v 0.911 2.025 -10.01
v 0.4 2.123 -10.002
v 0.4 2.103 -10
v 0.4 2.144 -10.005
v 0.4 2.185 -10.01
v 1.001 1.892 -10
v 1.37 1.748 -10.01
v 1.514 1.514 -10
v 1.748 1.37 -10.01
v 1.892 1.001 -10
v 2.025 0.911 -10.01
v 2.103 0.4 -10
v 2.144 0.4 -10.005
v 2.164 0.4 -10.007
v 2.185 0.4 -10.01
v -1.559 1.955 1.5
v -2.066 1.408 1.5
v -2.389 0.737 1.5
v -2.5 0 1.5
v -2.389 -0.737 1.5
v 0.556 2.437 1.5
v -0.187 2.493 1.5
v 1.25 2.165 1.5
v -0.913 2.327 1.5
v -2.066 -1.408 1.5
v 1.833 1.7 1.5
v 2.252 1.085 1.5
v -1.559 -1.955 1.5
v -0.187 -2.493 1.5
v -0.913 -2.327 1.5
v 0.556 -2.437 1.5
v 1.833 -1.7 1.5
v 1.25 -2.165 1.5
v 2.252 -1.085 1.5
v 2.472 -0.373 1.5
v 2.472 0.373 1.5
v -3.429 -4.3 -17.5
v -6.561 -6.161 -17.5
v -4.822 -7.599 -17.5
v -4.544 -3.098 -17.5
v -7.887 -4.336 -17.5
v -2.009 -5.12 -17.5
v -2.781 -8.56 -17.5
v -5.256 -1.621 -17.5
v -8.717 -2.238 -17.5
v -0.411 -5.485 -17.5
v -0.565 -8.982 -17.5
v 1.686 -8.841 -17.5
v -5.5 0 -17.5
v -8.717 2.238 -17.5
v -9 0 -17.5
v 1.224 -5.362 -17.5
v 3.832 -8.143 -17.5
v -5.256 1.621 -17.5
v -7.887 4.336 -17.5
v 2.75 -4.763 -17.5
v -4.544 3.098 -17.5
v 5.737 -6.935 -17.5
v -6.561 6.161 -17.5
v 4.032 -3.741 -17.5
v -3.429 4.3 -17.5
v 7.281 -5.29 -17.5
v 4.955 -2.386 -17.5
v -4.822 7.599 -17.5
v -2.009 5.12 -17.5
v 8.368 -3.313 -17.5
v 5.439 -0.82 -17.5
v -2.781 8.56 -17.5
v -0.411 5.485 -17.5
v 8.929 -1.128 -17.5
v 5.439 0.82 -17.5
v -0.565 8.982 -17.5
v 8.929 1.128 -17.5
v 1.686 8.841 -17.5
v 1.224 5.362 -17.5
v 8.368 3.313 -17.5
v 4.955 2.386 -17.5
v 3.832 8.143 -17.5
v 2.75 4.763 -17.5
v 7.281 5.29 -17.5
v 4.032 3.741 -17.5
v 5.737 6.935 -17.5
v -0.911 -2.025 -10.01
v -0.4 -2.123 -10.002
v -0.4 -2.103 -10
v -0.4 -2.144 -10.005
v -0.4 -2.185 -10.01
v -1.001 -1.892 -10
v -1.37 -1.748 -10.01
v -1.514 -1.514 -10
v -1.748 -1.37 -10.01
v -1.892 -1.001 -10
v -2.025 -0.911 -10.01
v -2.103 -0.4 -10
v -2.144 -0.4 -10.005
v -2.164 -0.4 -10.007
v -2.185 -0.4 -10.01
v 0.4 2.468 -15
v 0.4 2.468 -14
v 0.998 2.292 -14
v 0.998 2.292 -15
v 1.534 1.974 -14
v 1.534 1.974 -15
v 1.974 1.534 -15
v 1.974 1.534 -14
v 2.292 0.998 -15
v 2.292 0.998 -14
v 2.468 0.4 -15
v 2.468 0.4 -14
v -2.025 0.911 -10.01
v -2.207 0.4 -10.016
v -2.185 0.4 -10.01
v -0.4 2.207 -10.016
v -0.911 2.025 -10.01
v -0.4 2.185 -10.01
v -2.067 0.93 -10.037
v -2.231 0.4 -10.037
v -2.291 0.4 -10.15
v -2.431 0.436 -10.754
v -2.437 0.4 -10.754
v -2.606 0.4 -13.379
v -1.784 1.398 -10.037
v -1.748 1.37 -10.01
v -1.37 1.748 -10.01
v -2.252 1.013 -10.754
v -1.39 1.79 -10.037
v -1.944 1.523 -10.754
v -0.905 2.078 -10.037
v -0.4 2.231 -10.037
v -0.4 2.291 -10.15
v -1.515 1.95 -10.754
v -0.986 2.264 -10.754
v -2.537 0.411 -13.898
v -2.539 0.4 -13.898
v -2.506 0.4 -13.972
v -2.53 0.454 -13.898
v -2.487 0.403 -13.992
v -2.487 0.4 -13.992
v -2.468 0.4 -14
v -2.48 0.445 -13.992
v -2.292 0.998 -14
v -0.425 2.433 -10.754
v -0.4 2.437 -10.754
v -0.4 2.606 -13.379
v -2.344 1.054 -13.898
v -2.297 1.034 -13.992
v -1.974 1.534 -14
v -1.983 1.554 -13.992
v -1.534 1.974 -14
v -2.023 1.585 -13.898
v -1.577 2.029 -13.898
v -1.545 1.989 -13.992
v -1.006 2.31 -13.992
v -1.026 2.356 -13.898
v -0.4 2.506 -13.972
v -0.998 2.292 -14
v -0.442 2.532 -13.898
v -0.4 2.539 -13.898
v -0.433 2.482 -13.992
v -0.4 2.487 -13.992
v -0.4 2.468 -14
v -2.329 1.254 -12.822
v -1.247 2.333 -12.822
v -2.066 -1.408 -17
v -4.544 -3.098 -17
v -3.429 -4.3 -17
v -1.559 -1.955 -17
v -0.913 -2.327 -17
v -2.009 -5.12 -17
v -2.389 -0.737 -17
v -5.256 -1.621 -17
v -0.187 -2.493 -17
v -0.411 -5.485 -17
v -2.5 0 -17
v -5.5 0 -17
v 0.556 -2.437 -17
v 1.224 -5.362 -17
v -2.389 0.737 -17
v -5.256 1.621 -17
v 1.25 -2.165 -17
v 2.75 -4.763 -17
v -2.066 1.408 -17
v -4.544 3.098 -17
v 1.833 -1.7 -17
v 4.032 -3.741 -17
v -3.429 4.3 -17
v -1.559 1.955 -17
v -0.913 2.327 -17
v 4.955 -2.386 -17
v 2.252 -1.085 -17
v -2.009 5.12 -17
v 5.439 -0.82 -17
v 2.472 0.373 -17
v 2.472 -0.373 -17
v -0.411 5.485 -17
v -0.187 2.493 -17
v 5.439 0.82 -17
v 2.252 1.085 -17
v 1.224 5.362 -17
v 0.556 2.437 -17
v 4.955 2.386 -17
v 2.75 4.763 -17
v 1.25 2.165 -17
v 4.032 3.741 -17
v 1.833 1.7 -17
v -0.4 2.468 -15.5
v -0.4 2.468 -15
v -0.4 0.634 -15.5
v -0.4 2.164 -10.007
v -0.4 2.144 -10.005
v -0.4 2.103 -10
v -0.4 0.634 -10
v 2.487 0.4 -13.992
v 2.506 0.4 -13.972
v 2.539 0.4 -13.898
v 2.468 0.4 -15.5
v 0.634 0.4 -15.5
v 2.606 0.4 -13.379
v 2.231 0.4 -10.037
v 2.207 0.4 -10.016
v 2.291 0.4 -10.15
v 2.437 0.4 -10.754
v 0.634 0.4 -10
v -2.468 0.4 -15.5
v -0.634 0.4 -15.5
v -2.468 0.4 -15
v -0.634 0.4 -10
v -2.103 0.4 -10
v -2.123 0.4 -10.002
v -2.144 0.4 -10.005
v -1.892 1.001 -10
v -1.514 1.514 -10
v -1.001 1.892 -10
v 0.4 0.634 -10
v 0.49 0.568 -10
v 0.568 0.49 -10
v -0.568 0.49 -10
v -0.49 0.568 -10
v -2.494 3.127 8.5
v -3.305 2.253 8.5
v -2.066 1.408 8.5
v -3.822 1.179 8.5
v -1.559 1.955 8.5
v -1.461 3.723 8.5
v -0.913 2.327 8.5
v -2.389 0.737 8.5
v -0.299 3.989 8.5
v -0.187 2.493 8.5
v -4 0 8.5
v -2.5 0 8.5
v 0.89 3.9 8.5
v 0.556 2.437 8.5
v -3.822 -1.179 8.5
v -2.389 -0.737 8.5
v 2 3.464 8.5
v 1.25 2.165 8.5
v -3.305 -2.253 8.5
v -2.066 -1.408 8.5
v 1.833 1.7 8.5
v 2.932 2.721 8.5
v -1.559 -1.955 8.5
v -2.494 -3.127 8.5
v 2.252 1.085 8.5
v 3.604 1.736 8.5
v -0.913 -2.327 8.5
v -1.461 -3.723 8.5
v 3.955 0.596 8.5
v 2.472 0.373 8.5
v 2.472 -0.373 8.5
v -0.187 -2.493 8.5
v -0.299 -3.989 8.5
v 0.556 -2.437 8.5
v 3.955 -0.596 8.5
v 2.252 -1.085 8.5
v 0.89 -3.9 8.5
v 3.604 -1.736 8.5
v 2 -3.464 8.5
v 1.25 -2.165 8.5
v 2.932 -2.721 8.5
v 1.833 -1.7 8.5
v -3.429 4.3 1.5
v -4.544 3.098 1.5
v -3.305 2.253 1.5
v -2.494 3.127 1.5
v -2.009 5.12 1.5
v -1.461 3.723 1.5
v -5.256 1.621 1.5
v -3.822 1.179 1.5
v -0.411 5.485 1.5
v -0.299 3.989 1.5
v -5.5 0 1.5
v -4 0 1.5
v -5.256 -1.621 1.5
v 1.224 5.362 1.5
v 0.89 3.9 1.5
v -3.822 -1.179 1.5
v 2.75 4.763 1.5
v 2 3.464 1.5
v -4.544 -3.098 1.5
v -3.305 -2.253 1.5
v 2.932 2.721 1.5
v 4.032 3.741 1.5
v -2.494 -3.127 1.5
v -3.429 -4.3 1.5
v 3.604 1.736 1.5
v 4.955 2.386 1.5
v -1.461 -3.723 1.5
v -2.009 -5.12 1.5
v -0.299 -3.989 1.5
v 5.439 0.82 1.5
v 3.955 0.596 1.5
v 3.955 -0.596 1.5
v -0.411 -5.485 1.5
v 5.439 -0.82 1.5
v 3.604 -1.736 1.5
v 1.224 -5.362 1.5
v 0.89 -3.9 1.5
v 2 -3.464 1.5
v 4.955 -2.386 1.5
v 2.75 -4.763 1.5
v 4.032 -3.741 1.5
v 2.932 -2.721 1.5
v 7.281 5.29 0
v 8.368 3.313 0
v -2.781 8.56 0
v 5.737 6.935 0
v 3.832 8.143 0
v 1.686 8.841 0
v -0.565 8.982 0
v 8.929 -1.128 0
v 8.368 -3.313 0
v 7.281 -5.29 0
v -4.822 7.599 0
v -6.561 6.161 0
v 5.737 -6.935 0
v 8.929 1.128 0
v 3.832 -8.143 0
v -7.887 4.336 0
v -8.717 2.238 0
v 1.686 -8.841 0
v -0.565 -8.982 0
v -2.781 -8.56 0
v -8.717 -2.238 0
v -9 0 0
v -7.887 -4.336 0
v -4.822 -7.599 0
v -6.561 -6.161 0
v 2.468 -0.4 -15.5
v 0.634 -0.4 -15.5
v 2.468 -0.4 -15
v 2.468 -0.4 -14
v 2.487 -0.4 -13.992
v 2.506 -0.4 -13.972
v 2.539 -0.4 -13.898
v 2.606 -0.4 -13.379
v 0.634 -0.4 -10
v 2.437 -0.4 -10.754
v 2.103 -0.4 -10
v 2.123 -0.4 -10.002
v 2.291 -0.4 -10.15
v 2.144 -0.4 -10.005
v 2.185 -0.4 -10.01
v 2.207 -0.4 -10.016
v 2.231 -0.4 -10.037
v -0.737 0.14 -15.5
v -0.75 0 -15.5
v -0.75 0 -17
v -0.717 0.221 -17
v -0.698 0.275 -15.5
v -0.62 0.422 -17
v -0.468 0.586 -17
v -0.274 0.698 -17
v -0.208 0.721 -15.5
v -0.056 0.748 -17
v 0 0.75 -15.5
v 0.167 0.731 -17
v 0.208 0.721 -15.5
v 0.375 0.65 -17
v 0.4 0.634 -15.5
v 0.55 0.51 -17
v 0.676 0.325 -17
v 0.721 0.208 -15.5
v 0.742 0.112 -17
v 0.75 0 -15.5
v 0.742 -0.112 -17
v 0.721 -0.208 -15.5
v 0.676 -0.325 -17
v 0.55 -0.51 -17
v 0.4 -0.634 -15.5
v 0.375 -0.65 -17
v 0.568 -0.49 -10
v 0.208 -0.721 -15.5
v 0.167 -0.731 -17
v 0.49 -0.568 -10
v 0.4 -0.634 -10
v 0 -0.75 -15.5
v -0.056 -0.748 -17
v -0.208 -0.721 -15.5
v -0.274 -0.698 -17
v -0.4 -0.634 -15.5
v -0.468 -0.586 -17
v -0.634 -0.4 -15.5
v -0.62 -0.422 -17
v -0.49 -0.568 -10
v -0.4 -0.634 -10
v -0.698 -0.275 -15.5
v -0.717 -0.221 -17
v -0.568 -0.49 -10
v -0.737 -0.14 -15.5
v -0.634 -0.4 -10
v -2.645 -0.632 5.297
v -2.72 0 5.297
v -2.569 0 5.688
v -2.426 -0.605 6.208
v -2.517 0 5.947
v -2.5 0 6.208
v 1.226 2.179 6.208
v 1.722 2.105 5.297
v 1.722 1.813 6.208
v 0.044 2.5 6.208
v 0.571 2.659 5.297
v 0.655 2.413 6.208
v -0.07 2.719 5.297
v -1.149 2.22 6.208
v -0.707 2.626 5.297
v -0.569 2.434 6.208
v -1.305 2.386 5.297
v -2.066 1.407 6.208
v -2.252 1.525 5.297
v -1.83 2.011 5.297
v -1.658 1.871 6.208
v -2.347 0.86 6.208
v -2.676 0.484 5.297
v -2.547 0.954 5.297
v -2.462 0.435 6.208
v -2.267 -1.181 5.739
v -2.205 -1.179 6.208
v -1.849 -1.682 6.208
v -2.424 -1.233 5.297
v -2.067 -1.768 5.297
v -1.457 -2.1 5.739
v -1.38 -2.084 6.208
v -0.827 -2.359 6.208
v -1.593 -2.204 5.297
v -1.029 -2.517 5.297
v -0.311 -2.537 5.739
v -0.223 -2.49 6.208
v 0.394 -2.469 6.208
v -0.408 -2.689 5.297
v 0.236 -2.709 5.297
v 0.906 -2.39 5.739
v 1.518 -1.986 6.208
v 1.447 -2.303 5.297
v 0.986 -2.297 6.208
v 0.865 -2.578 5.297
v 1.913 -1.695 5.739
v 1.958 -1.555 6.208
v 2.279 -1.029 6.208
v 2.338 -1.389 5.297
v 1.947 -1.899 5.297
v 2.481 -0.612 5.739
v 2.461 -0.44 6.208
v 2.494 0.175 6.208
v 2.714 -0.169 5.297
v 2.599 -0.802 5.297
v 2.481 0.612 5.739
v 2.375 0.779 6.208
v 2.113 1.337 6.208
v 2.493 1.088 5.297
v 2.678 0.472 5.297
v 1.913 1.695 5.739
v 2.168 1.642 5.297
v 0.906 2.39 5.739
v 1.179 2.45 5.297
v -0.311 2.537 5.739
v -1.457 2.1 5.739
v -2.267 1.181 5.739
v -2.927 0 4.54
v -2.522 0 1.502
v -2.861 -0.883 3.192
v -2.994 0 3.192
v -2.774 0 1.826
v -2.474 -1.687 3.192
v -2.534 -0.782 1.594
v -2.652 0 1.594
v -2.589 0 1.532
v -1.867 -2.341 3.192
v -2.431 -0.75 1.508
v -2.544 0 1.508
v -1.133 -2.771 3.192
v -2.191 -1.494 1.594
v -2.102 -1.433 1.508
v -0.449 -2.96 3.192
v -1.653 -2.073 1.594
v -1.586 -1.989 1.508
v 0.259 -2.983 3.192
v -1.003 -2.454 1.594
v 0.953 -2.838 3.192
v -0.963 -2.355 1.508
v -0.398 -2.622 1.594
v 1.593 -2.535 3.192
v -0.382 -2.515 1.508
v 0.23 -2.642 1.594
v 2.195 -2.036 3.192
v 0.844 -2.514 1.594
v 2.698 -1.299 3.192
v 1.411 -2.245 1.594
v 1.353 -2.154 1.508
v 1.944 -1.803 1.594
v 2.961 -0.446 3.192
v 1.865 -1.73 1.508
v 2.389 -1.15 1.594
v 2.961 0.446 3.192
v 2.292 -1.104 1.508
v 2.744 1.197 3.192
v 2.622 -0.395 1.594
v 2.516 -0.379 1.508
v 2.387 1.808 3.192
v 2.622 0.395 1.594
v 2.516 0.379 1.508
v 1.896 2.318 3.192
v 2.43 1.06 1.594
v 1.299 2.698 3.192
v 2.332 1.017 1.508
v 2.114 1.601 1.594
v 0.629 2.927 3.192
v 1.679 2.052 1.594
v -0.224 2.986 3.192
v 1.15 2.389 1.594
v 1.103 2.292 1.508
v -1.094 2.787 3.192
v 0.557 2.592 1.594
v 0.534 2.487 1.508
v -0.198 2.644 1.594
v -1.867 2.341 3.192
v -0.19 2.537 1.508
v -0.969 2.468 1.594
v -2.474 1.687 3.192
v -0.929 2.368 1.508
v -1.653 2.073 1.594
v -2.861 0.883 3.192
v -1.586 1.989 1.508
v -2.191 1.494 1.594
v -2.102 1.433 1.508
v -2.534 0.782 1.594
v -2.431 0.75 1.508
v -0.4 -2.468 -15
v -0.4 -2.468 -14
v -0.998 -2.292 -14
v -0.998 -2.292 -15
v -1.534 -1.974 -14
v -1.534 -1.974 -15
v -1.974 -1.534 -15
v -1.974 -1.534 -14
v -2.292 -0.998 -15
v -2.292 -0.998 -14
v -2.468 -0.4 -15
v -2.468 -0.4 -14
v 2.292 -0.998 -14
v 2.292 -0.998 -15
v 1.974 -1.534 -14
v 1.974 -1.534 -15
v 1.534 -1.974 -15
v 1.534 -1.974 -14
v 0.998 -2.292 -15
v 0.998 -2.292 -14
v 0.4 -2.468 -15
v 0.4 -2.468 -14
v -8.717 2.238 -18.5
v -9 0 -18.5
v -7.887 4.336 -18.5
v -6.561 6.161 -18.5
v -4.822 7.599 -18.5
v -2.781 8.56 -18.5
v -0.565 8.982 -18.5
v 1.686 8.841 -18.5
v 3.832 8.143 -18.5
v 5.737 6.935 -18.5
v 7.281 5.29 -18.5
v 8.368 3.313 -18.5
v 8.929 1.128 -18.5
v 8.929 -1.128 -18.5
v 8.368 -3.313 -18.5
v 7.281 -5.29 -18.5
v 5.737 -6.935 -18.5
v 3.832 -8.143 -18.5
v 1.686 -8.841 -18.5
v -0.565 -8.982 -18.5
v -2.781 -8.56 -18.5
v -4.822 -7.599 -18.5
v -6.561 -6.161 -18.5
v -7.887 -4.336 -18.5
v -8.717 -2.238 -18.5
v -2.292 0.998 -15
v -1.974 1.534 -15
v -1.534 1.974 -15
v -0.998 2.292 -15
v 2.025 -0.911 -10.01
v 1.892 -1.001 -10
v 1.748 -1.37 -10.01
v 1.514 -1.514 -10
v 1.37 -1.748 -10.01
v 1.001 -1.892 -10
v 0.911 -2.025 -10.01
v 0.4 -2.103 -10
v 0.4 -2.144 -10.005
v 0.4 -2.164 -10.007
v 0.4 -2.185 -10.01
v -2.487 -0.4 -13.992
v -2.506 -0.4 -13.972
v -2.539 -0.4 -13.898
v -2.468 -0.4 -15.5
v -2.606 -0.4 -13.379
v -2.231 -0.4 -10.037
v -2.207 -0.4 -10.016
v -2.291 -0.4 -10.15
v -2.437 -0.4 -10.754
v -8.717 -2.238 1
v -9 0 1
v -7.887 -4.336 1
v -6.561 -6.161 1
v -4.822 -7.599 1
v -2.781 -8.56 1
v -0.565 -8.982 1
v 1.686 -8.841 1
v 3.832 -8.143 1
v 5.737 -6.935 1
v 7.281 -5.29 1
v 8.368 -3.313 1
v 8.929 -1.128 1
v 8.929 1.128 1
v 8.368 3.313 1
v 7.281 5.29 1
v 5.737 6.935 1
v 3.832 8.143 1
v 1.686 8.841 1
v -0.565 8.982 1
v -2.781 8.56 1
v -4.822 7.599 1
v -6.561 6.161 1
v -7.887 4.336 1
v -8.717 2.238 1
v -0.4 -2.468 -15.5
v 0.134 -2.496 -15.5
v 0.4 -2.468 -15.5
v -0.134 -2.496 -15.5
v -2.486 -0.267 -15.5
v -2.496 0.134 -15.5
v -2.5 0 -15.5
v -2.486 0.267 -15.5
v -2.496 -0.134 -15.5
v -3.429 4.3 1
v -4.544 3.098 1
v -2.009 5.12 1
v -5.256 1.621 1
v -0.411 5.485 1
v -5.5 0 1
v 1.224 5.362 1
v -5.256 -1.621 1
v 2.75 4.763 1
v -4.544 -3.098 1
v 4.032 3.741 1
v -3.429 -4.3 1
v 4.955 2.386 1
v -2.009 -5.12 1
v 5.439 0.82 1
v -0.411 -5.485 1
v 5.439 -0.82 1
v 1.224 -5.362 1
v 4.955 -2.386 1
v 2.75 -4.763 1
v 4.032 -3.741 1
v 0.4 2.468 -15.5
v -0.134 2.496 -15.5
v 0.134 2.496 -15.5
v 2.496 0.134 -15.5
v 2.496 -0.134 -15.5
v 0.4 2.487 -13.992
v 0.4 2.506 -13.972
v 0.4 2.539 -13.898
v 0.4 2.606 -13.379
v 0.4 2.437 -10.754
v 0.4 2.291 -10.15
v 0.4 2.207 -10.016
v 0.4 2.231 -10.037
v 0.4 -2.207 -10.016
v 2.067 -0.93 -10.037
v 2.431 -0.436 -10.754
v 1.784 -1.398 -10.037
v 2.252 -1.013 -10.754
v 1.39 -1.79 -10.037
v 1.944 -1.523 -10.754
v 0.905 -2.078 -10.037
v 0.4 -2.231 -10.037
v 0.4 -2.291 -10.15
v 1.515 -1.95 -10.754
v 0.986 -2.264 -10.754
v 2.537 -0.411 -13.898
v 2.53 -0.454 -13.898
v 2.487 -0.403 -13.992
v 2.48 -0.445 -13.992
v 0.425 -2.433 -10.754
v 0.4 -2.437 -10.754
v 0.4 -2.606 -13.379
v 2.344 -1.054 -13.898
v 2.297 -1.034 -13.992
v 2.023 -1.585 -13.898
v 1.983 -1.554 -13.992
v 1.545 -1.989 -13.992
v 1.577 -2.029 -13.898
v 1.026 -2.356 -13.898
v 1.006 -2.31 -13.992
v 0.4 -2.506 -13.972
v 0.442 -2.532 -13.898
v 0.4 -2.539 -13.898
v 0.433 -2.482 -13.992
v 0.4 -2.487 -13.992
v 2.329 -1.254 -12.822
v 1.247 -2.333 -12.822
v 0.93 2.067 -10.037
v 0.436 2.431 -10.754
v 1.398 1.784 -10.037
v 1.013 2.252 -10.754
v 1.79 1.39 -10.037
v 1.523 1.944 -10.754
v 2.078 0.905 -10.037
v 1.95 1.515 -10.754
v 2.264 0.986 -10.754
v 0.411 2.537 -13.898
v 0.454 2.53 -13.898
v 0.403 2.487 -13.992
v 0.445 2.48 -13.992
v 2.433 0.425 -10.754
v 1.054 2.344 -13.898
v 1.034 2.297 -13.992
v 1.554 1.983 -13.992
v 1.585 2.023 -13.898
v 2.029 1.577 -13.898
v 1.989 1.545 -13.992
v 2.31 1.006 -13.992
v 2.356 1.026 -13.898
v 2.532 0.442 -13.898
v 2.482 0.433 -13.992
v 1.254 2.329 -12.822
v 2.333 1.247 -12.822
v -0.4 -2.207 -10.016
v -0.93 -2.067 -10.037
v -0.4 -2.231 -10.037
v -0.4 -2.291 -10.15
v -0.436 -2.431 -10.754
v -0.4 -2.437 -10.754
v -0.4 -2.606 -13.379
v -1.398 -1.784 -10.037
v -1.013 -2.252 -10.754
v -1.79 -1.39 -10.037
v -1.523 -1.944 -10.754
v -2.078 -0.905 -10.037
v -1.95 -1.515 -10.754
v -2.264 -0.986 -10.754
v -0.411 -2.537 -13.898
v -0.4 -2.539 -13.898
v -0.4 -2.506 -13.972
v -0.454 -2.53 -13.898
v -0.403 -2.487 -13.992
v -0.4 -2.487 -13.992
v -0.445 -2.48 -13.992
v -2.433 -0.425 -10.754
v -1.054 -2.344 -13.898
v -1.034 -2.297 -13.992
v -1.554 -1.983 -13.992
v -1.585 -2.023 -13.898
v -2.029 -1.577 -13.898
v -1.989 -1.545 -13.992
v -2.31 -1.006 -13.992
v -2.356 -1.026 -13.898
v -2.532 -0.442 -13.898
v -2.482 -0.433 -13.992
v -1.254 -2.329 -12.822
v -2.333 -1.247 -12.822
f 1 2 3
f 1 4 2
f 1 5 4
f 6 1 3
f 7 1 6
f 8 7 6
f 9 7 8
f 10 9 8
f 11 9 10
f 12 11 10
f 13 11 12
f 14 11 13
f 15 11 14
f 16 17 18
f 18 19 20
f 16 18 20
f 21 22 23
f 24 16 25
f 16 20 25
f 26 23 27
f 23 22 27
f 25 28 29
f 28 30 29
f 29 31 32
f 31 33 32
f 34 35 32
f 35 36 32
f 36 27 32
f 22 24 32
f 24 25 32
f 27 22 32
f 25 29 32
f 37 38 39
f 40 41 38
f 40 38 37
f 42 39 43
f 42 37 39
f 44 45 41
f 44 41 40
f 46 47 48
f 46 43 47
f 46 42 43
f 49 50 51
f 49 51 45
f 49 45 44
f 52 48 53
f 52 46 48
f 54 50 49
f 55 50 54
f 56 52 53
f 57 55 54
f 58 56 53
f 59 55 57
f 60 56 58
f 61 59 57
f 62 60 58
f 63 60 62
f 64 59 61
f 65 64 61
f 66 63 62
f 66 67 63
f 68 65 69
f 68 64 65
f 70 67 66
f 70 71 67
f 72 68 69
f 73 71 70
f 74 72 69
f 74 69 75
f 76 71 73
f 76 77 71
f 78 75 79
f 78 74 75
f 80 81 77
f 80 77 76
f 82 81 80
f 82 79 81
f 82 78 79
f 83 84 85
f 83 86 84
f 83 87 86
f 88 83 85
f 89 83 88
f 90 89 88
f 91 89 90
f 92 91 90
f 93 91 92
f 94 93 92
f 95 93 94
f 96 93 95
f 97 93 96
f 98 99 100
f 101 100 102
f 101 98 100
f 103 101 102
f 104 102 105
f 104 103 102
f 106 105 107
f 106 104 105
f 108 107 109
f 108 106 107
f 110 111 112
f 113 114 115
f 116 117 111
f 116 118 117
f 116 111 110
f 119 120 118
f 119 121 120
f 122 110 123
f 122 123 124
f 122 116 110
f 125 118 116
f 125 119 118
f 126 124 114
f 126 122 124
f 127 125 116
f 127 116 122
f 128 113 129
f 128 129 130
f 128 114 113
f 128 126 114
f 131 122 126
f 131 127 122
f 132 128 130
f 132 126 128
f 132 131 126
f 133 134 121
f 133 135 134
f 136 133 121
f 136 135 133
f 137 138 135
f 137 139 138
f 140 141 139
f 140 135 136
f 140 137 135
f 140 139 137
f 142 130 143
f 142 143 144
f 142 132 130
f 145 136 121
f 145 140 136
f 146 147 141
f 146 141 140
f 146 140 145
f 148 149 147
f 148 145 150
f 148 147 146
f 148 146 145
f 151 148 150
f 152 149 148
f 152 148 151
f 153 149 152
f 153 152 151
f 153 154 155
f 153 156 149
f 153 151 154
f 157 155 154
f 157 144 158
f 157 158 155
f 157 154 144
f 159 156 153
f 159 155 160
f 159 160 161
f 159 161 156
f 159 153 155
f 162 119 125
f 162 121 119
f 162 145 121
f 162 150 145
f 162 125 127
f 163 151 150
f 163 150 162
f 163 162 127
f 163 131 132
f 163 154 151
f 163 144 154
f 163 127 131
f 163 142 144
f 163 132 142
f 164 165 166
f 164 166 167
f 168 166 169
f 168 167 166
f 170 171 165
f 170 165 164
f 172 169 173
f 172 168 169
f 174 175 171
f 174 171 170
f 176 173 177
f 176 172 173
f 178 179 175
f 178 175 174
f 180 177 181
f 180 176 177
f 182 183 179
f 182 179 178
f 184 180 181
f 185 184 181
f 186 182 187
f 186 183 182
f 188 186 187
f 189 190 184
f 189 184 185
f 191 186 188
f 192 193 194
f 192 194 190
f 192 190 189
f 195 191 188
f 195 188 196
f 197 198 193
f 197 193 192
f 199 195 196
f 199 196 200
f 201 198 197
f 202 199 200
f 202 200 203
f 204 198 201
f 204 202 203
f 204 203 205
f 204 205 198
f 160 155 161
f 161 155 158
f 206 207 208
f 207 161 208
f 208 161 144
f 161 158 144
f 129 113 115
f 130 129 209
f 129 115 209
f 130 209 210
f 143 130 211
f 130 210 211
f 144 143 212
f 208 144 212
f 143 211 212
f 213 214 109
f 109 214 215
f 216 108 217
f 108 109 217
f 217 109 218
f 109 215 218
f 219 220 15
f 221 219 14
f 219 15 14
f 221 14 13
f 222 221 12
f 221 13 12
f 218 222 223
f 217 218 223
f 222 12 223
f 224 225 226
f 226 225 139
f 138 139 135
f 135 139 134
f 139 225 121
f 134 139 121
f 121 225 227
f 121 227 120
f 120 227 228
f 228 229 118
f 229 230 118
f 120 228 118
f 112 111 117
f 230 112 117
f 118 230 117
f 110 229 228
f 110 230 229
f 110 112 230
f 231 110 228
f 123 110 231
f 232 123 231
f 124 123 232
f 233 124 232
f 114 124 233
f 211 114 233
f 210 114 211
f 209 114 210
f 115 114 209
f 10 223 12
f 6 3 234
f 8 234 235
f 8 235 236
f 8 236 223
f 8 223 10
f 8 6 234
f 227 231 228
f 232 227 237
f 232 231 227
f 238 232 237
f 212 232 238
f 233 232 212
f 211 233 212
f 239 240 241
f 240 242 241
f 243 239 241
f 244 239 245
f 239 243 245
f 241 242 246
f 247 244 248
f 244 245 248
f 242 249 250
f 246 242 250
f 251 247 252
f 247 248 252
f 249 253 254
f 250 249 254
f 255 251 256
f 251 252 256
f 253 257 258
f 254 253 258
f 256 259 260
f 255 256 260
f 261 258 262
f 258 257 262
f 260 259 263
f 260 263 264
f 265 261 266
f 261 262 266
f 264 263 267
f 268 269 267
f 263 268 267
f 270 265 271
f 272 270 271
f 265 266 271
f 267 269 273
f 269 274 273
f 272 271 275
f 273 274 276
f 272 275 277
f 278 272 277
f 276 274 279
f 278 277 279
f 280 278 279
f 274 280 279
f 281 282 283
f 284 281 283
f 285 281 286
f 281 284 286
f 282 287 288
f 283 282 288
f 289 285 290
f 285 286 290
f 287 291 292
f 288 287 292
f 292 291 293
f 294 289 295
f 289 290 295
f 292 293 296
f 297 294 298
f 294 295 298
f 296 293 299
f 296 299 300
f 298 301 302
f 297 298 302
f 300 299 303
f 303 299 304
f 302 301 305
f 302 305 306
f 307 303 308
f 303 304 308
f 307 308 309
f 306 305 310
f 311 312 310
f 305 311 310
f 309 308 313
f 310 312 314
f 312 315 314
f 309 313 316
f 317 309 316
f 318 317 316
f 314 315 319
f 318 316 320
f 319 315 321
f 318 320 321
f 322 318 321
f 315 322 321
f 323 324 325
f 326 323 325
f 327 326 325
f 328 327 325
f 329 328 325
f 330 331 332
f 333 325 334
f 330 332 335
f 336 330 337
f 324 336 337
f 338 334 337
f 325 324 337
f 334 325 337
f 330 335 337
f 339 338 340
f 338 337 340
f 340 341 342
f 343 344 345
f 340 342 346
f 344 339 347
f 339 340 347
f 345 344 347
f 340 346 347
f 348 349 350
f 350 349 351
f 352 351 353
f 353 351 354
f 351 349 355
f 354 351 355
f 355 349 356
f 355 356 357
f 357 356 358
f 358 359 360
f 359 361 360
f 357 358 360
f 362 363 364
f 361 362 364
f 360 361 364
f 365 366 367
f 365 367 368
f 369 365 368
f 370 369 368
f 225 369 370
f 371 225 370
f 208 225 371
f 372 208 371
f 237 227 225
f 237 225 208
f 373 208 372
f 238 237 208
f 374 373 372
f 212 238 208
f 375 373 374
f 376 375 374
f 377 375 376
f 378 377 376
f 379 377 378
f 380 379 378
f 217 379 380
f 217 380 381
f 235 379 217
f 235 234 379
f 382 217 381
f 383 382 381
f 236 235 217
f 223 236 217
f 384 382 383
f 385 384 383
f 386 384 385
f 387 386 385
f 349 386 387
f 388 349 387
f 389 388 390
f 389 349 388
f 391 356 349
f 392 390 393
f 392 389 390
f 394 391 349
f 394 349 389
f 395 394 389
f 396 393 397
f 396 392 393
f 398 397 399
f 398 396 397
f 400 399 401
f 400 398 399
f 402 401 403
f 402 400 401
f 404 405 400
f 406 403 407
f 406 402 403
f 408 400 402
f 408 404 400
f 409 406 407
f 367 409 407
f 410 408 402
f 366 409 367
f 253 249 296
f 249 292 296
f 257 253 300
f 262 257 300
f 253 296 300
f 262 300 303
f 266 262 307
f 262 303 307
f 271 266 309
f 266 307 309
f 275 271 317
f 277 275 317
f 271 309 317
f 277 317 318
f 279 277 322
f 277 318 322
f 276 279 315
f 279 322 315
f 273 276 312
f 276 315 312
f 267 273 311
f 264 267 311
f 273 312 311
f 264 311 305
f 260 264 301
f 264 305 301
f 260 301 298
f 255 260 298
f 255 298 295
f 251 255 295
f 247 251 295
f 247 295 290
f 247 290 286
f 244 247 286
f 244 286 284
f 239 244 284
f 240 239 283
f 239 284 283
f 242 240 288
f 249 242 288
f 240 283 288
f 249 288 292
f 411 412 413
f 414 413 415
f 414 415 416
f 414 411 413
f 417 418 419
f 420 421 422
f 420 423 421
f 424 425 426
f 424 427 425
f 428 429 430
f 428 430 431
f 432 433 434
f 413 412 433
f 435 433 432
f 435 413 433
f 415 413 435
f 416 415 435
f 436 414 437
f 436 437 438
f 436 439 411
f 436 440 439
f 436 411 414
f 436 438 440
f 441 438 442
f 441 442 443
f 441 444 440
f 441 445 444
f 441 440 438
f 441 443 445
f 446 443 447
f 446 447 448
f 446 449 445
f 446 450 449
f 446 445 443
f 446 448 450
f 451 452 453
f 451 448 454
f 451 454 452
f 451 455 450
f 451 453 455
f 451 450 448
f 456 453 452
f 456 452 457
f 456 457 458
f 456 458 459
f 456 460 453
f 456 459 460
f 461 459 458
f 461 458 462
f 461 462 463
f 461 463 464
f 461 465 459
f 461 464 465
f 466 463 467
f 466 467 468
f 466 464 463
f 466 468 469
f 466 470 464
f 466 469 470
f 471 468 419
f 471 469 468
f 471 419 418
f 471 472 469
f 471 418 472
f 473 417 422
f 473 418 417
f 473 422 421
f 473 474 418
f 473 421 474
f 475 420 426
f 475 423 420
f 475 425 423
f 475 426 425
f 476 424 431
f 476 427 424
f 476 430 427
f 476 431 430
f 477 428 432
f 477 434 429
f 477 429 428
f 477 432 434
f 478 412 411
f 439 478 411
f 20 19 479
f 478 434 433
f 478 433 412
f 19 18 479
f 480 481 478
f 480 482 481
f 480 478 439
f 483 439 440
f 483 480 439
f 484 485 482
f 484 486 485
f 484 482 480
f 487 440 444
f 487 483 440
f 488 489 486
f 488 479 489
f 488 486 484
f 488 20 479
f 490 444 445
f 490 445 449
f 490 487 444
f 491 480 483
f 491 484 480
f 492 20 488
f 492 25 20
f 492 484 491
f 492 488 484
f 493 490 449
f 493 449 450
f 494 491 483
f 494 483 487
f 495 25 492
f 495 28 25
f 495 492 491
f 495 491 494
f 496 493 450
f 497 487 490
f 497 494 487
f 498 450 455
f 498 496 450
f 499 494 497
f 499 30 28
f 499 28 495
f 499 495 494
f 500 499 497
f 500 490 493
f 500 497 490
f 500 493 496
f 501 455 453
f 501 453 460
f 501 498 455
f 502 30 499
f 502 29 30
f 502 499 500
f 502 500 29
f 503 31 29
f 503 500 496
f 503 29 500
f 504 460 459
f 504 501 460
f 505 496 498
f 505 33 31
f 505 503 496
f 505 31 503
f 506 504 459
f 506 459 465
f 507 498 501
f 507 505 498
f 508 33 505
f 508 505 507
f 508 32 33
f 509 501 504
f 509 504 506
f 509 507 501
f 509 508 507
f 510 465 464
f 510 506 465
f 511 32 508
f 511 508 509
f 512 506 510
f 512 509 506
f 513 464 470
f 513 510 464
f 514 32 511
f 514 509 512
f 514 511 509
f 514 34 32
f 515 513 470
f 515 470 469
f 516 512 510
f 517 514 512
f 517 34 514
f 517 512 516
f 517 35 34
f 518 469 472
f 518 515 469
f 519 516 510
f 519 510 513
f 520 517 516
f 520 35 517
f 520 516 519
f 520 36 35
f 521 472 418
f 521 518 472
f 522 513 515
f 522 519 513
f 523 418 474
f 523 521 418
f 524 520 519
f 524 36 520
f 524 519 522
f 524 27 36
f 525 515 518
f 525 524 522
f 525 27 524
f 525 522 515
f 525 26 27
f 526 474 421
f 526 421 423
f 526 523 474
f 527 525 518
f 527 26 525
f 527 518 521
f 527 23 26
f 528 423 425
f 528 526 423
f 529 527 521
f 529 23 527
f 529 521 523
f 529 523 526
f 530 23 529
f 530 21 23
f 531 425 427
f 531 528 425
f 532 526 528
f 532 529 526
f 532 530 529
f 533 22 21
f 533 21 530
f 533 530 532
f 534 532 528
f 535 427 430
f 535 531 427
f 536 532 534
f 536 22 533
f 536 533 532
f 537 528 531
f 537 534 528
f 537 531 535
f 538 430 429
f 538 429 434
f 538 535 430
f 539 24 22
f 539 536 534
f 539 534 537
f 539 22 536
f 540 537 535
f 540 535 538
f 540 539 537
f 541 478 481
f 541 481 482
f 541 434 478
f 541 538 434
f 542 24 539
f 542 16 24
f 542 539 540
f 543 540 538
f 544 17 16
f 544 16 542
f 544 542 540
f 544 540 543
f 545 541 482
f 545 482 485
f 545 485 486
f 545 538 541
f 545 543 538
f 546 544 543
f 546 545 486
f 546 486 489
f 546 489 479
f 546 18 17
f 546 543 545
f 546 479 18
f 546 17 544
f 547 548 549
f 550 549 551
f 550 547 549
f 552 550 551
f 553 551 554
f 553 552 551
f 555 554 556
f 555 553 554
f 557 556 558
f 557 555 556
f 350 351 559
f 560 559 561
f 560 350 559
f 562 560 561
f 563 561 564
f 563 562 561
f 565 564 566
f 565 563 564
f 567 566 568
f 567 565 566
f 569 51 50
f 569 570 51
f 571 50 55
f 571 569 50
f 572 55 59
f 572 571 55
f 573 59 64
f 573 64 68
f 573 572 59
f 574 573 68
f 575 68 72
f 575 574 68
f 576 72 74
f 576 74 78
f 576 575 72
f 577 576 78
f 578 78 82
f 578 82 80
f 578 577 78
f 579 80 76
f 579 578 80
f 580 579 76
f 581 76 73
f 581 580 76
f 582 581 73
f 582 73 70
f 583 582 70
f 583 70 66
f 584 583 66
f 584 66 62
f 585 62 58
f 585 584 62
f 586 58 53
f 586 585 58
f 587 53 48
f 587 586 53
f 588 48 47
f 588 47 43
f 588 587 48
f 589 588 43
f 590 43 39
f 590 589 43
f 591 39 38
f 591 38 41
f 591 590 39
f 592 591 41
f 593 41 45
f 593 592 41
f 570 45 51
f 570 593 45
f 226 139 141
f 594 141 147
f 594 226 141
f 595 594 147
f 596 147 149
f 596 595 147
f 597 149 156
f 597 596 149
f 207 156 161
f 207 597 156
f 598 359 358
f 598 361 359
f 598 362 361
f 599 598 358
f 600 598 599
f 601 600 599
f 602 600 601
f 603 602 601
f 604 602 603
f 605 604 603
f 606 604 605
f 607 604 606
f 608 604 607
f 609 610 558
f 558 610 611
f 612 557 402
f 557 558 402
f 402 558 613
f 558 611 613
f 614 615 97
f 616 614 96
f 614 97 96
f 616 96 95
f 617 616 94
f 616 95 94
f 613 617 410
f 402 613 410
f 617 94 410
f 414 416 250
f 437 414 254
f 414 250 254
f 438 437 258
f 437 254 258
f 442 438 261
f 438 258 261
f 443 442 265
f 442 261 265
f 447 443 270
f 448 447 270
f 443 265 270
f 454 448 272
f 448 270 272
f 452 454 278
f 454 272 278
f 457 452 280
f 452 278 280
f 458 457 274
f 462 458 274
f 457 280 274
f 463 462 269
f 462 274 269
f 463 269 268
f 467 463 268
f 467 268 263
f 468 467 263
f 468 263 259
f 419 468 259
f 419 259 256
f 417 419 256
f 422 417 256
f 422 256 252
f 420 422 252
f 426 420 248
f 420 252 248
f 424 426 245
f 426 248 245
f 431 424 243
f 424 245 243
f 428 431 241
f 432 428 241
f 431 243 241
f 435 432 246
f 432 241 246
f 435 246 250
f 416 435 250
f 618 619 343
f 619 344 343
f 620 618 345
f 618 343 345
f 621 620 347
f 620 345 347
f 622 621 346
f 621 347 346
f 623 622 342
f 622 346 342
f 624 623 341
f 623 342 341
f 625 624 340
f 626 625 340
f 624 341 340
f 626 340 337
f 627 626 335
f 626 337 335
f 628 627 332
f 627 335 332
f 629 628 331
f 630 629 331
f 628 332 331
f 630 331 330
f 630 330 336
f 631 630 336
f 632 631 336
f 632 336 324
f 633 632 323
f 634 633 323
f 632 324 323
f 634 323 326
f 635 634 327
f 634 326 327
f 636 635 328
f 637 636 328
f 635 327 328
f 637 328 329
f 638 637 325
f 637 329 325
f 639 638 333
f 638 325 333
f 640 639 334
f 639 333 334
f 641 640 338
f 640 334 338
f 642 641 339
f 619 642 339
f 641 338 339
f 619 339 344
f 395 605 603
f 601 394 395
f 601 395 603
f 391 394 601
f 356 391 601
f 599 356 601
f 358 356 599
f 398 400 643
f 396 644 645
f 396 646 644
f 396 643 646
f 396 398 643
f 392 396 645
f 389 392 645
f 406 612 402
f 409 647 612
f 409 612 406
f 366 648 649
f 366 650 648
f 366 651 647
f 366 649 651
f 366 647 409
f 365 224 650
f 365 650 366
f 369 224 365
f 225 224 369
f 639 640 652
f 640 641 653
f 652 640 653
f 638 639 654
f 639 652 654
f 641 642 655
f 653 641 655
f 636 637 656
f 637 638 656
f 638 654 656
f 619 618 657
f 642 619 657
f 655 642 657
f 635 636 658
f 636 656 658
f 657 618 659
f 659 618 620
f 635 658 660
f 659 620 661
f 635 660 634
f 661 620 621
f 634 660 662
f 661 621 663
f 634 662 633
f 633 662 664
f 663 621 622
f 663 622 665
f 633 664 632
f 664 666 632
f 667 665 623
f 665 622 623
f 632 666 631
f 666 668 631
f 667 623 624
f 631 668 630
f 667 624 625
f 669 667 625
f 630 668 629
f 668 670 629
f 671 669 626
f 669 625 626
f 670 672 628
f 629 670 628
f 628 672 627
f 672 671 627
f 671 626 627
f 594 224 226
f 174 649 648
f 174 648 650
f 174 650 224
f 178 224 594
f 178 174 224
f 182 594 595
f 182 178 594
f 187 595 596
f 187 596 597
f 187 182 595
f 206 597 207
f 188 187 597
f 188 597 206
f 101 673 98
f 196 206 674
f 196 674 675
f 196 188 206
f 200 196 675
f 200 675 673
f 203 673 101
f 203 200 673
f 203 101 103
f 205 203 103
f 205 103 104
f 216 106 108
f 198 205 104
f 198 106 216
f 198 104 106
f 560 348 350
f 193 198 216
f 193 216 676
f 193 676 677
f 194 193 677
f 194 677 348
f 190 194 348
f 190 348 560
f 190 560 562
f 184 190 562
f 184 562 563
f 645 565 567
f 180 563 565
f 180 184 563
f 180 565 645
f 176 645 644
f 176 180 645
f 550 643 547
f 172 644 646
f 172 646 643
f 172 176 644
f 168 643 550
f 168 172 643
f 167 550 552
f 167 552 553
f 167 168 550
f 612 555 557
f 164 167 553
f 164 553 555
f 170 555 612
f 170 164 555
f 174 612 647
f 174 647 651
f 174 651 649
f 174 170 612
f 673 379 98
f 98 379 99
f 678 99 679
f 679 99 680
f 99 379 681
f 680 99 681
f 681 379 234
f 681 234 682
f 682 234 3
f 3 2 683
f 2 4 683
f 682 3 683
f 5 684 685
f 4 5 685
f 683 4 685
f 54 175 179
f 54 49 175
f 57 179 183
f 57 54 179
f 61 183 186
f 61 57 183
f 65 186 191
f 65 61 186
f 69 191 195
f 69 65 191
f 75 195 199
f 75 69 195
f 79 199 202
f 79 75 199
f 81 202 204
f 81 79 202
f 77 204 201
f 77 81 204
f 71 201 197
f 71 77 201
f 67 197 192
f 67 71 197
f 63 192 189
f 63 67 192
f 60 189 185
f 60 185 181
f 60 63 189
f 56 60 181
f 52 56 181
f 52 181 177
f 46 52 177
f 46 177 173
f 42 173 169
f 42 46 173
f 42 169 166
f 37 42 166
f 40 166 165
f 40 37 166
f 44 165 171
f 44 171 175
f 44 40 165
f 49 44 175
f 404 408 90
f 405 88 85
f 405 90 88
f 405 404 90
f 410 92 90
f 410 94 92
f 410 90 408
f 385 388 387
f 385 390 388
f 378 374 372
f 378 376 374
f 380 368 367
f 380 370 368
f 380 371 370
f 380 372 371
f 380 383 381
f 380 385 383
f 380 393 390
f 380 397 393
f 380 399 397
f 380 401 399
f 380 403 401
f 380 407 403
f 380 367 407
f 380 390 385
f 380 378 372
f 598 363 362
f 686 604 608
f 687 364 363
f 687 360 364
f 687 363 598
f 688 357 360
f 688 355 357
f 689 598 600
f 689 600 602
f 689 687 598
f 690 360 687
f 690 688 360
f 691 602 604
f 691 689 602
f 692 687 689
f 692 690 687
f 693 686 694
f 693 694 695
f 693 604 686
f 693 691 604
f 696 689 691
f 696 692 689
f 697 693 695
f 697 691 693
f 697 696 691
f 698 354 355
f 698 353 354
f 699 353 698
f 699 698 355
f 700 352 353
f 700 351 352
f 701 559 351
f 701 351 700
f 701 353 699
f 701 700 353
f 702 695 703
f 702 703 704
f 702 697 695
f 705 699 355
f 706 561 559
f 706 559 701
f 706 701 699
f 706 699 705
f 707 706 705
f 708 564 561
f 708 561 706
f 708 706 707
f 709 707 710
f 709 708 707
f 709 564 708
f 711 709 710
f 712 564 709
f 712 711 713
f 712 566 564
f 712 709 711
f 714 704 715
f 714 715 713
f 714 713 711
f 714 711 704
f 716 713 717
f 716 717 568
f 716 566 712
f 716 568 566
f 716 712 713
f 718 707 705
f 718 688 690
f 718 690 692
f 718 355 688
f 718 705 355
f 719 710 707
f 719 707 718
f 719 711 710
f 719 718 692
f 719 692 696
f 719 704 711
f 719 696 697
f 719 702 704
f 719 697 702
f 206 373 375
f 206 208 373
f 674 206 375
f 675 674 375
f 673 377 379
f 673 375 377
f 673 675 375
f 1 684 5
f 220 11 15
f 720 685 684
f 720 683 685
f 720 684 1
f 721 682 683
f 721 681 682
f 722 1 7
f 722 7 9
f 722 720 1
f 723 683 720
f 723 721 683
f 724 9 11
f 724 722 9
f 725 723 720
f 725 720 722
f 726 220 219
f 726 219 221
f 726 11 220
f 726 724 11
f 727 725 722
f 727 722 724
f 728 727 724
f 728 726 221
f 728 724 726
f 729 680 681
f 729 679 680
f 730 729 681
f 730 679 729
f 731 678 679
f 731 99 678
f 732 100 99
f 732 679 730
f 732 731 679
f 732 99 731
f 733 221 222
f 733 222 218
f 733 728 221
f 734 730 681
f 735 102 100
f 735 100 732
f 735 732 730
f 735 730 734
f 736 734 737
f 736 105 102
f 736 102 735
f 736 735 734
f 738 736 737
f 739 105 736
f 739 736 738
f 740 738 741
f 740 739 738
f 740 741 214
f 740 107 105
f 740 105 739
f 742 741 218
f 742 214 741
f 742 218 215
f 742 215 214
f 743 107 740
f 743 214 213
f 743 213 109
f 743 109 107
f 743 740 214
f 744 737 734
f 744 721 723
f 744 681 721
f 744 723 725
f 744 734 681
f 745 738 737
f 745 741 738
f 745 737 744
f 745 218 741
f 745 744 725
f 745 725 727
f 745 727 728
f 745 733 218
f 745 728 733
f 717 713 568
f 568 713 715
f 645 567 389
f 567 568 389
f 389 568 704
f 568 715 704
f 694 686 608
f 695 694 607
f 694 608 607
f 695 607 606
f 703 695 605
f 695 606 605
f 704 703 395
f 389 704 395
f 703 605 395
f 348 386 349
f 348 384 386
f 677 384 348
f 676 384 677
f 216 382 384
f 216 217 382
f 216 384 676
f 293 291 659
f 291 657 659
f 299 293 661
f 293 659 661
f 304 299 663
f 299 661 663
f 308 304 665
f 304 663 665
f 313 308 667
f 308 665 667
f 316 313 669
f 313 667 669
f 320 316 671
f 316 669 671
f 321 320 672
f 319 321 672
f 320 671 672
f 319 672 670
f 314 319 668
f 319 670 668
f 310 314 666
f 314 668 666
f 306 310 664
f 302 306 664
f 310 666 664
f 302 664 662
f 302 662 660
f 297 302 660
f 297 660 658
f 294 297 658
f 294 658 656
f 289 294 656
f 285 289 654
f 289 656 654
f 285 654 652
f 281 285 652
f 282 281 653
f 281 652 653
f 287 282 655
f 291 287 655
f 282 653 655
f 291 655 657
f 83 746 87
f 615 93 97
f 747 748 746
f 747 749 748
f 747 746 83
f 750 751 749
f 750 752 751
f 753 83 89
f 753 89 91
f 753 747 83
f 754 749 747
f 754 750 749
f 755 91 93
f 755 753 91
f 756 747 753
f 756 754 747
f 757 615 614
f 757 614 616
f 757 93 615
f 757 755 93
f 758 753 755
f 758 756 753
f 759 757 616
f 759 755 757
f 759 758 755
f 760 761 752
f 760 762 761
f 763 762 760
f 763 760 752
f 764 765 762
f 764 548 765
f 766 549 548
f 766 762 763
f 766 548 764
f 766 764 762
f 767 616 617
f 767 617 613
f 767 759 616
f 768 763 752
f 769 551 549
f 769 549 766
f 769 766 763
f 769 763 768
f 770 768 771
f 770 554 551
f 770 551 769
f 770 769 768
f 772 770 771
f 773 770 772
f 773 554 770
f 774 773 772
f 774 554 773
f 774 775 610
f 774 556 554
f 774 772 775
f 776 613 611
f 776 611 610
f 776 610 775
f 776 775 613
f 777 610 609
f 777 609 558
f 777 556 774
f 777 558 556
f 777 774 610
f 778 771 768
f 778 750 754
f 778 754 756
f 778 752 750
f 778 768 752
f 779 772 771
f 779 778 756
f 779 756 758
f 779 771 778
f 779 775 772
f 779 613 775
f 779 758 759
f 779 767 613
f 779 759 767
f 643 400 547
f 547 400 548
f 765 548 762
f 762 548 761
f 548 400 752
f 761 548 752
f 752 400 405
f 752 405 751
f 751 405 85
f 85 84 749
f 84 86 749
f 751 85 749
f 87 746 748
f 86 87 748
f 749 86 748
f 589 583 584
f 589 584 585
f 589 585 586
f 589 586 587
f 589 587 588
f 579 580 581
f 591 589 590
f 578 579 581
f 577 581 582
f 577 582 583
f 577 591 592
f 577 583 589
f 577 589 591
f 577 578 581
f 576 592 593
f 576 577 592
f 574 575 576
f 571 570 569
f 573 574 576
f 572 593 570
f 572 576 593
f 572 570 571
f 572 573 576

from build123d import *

# Parameters (mm, degrees)
F2_R     = 2
F4_W     = 0.8
F4_H     = 0.8
F5_DEPTH = 5.5


# Not quite as in the source:
# - ends of sketch curves that miss each other by under 0.0002 mm in the source are joined


with BuildPart() as f1:
    # F0 (on Front) → F1 (revolve)
    with BuildSketch(Plane.XZ):
        with BuildLine():
            Line((-9, 0), (0, 0))
            Line((0, 0), (0, 1.5))
            Line((0, 1.5), (-2.5, 1.5))
            add(Edge.make_bspline(
                [(-2.5, 5.5), (-3, 5.5), (-3, 3.5), (-3, 1.5), (-2.5, 1.5)],
                knots=[3.1415926536, 3.1415926536, 3.1415926536, 4.7123889804, 4.7123889804, 6.2831853072, 6.2831853072, 6.2831853072], degree=2, weights=[1, 0.7071067812, 1, 0.7071067812, 1]))
            Line((-2.5, 5.5), (-2.5, 8.5))
            Line((-2.5, 8.5), (-4, 8.5))
            Line((-4, 8.5), (-4, 1.5))
            Line((-4, 1.5), (-5.5, 1.5))
            Line((-5.5, 1.5), (-5.5, 1))
            Line((-5.5, 1), (-9, 1))
            Line((-9, 1), (-9, 0))
        make_face()
    revolve(axis=Axis((0, 0, 0.75), (0, 0, 1)))

    # F2
    f2_edges = [f1.edges().sort_by_distance(p)[0] for p in [
        (2.5, 0, 5.5),
    ]]
    fillet(f2_edges, radius=F2_R)


with BuildPart() as f3:
    # F0 (on Front) → F3 (revolve)
    with BuildSketch(Plane.XZ):
        with BuildLine():
            Line((-9, -18.5), (0, -18.5))
            Line((0, -18.5), (0, -17))
            Line((0, -17), (-0.75, -17))
            Line((-0.75, -17), (-0.75, -10))
            Line((-0.75, -10), (-2.14088, -10))
            Line((-2.14088, -10), (-2.2209772679, -10.009743799))
            add(Edge.make_bspline(
                [(-2.2209772679, -10.009743799), (-2.4703682805, -9.9923046805), (-2.609881228, -11.987432781), (-2.7493941755, -13.9825608816), (-2.5000031629, -14)],
                knots=[3.1415926536, 3.1415926536, 3.1415926536, 4.7123889804, 4.7123889804, 6.2831853072, 6.2831853072, 6.2831853072], degree=2, weights=[1, 0.7071067812, 1, 0.7071067812, 1]))
            Line((-2.5000031629, -14), (-2.5, -15))
            Line((-2.5, -15), (-2.5, -17))
            Line((-2.5, -17), (-4, -17))
            Line((-4, -17), (-5.5, -17))
            Line((-5.5, -17), (-5.5, -17.5))
            Line((-5.5, -17.5), (-9, -17.5))
            Line((-9, -17.5), (-9, -18.5))
        make_face()
    revolve(axis=Axis((0, 0, -17.75), (0, 0, -1)))

    # F4 (on face) → F5 (cut)
    with BuildSketch(Plane.XY.offset(-10)):
        with BuildLine():
            Line((-0.4, -6), (0.4, -6))
            Line((0.4, -6), (0.4, -2.1031802525))
            ThreePointArc((0.4, -2.1031802525), (0, -2.14088), (-0.4, -2.1031802525))
            Line((-0.4, -2.1031802525), (-0.4, -6))
        make_face()
        with BuildLine():
            ThreePointArc((-0.4, -2.1031802525), (0, -2.14088), (0.4, -2.1031802525))
            Line((0.4, -2.1031802525), (0.4, -0.634428877))
            ThreePointArc((0.4, -0.634428877), (0, -0.75), (-0.4, -0.634428877))
            Line((-0.4, -0.634428877), (-0.4, -2.1031802525))
        make_face()
        with BuildLine():
            ThreePointArc((-0.4, -0.634428877), (0, -0.75), (0.4, -0.634428877))
            Line((0.4, -0.634428877), (0.4, -0.4))
            Line((0.4, -0.4), (-0.4, -0.4))
            Line((-0.4, -0.4), (-0.4, -0.634428877))
        make_face()
        with BuildLine():
            Line((-0.634428877, -0.4), (-0.4, -0.4))
            Line((-0.4, -0.4), (-0.4, 0.4))
            Line((-0.4, 0.4), (-0.634428877, 0.4))
            ThreePointArc((-0.634428877, 0.4), (-0.75, 0), (-0.634428877, -0.4))
        make_face()
        with BuildLine():
            Line((-6, -0.4), (-2.1031802525, -0.4))
            ThreePointArc((-2.1031802525, -0.4), (-2.14088, 0), (-2.1031802525, 0.4))
            Line((-2.1031802525, 0.4), (-6, 0.4))
            Line((-6, 0.4), (-6, -0.4))
        make_face()
        Rectangle(F4_W, F4_H)
        with BuildLine():
            Line((-0.4, 0.4), (0.4, 0.4))
            Line((0.4, 0.4), (0.4, 0.634428877))
            ThreePointArc((0.4, 0.634428877), (0, 0.75), (-0.4, 0.634428877))
            Line((-0.4, 0.634428877), (-0.4, 0.4))
        make_face()
        with BuildLine():
            ThreePointArc((0.4, 2.1031802525), (0, 2.14088), (-0.4, 2.1031802525))
            Line((-0.4, 2.1031802525), (-0.4, 0.634428877))
            ThreePointArc((-0.4, 0.634428877), (0, 0.75), (0.4, 0.634428877))
            Line((0.4, 0.634428877), (0.4, 2.1031802525))
        make_face()
        with BuildLine():
            Line((-0.4, 6), (-0.4, 2.1031802525))
            ThreePointArc((-0.4, 2.1031802525), (0, 2.14088), (0.4, 2.1031802525))
            Line((0.4, 2.1031802525), (0.4, 6))
            Line((0.4, 6), (-0.4, 6))
        make_face()
        with BuildLine():
            Line((0.634428877, -0.4), (2.1031802525, -0.4))
            ThreePointArc((2.1031802525, -0.4), (2.1314342253, -0.2008863304), (2.14088, 0))
            ThreePointArc((2.14088, 0), (2.1314342253, 0.2008863304), (2.1031802525, 0.4))
            Line((2.1031802525, 0.4), (0.634428877, 0.4))
            ThreePointArc((0.634428877, 0.4), (0.7205281597, 0.2081806214), (0.75, 0))
            ThreePointArc((0.75, 0), (0.7205281597, -0.2081806214), (0.634428877, -0.4))
        make_face()
        with BuildLine():
            Line((0.4, 0.4), (0.4, -0.4))
            Line((0.4, -0.4), (0.634428877, -0.4))
            ThreePointArc((0.634428877, -0.4), (0.7205281597, -0.2081806214), (0.75, 0))
            ThreePointArc((0.75, 0), (0.7205281597, 0.2081806214), (0.634428877, 0.4))
            Line((0.634428877, 0.4), (0.4, 0.4))
        make_face()
        with BuildLine():
            ThreePointArc((2.14088, 0), (2.1314342253, -0.2008863304), (2.1031802525, -0.4))
            Line((2.1031802525, -0.4), (6, -0.4))
            Line((6, -0.4), (6, 0.4))
            Line((6, 0.4), (2.1031802525, 0.4))
            ThreePointArc((2.1031802525, 0.4), (2.1314342253, 0.2008863304), (2.14088, 0))
        make_face()
        with BuildLine():
            ThreePointArc((-2.1031802525, 0.4), (-2.14088, 0), (-2.1031802525, -0.4))
            Line((-2.1031802525, -0.4), (-0.634428877, -0.4))
            ThreePointArc((-0.634428877, -0.4), (-0.75, 0), (-0.634428877, 0.4))
            Line((-0.634428877, 0.4), (-2.1031802525, 0.4))
        make_face()
    extrude(amount=-F5_DEPTH, mode=Mode.SUBTRACT)


solid = Compound([f1.part, f3.part])
